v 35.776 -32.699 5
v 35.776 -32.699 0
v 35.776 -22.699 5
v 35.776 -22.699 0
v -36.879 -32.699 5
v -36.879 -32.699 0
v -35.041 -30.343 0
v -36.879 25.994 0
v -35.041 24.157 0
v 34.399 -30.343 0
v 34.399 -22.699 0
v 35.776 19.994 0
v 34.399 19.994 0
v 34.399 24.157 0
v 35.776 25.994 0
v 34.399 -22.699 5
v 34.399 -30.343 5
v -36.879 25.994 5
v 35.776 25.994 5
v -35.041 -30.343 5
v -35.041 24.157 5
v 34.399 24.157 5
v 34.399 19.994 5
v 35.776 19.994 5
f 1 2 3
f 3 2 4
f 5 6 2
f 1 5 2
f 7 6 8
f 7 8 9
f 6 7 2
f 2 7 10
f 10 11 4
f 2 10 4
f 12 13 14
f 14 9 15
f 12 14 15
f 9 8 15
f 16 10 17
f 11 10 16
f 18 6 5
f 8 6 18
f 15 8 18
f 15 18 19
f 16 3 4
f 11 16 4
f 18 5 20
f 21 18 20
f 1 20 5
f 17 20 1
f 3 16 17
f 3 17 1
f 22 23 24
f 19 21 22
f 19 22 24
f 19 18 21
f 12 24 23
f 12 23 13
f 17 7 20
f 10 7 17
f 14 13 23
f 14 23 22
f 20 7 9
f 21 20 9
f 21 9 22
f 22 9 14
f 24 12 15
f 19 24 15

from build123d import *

# Parameters (mm, degrees)
SKETCH2_W           = 72.654814815
SKETCH2_H           = 58.693333333
SKETCH2_W_2         = 69.44
SKETCH2_H_2         = 54.5
BOSS_EXTRUDE1_DEPTH = 5
SKETCH3_W           = 5
SKETCH3_H           = 10
CUT_EXTRUDE1_DEPTH  = 10
CUT_EXTRUDE4_DEPTH  = 10


with BuildPart() as part:
    # Sketch2 → Boss-Extrude1 (new body)
    with BuildSketch(Plane.XY):
        with Locations((-0.551111111, -3.352592593)):
            Rectangle(SKETCH2_W, SKETCH2_H)
        with Locations((-0.321481481, -3.092962963)):
            Rectangle(SKETCH2_W_2, SKETCH2_H_2, mode=Mode.SUBTRACT)
    extrude(amount=BOSS_EXTRUDE1_DEPTH)

    # Sketch3 → Cut-Extrude1 (cut)
    with BuildSketch(Plane(origin=(35.776296296, 0, 0), x_dir=(0, 0, -1), z_dir=(1, 0, 0))):
        with Locations((-2.5, 14.994074074)):
            Rectangle(SKETCH3_W, SKETCH3_H)
    extrude(amount=-CUT_EXTRUDE1_DEPTH, mode=Mode.SUBTRACT)

    # Sketch4 → Cut-Extrude4 (cut)
    with BuildSketch(Plane(origin=(35.776296296, 0, 0), x_dir=(0, 0, -1), z_dir=(1, 0, 0))):
        Polygon((-5, -10.699259259), (-5, -22.699259259), (0, -22.699259259), (0, -10.699259259), (0, 9.994074074), (-5, 9.994074074), align=None)
    extrude(amount=-CUT_EXTRUDE4_DEPTH, mode=Mode.SUBTRACT)


solid = part.part
